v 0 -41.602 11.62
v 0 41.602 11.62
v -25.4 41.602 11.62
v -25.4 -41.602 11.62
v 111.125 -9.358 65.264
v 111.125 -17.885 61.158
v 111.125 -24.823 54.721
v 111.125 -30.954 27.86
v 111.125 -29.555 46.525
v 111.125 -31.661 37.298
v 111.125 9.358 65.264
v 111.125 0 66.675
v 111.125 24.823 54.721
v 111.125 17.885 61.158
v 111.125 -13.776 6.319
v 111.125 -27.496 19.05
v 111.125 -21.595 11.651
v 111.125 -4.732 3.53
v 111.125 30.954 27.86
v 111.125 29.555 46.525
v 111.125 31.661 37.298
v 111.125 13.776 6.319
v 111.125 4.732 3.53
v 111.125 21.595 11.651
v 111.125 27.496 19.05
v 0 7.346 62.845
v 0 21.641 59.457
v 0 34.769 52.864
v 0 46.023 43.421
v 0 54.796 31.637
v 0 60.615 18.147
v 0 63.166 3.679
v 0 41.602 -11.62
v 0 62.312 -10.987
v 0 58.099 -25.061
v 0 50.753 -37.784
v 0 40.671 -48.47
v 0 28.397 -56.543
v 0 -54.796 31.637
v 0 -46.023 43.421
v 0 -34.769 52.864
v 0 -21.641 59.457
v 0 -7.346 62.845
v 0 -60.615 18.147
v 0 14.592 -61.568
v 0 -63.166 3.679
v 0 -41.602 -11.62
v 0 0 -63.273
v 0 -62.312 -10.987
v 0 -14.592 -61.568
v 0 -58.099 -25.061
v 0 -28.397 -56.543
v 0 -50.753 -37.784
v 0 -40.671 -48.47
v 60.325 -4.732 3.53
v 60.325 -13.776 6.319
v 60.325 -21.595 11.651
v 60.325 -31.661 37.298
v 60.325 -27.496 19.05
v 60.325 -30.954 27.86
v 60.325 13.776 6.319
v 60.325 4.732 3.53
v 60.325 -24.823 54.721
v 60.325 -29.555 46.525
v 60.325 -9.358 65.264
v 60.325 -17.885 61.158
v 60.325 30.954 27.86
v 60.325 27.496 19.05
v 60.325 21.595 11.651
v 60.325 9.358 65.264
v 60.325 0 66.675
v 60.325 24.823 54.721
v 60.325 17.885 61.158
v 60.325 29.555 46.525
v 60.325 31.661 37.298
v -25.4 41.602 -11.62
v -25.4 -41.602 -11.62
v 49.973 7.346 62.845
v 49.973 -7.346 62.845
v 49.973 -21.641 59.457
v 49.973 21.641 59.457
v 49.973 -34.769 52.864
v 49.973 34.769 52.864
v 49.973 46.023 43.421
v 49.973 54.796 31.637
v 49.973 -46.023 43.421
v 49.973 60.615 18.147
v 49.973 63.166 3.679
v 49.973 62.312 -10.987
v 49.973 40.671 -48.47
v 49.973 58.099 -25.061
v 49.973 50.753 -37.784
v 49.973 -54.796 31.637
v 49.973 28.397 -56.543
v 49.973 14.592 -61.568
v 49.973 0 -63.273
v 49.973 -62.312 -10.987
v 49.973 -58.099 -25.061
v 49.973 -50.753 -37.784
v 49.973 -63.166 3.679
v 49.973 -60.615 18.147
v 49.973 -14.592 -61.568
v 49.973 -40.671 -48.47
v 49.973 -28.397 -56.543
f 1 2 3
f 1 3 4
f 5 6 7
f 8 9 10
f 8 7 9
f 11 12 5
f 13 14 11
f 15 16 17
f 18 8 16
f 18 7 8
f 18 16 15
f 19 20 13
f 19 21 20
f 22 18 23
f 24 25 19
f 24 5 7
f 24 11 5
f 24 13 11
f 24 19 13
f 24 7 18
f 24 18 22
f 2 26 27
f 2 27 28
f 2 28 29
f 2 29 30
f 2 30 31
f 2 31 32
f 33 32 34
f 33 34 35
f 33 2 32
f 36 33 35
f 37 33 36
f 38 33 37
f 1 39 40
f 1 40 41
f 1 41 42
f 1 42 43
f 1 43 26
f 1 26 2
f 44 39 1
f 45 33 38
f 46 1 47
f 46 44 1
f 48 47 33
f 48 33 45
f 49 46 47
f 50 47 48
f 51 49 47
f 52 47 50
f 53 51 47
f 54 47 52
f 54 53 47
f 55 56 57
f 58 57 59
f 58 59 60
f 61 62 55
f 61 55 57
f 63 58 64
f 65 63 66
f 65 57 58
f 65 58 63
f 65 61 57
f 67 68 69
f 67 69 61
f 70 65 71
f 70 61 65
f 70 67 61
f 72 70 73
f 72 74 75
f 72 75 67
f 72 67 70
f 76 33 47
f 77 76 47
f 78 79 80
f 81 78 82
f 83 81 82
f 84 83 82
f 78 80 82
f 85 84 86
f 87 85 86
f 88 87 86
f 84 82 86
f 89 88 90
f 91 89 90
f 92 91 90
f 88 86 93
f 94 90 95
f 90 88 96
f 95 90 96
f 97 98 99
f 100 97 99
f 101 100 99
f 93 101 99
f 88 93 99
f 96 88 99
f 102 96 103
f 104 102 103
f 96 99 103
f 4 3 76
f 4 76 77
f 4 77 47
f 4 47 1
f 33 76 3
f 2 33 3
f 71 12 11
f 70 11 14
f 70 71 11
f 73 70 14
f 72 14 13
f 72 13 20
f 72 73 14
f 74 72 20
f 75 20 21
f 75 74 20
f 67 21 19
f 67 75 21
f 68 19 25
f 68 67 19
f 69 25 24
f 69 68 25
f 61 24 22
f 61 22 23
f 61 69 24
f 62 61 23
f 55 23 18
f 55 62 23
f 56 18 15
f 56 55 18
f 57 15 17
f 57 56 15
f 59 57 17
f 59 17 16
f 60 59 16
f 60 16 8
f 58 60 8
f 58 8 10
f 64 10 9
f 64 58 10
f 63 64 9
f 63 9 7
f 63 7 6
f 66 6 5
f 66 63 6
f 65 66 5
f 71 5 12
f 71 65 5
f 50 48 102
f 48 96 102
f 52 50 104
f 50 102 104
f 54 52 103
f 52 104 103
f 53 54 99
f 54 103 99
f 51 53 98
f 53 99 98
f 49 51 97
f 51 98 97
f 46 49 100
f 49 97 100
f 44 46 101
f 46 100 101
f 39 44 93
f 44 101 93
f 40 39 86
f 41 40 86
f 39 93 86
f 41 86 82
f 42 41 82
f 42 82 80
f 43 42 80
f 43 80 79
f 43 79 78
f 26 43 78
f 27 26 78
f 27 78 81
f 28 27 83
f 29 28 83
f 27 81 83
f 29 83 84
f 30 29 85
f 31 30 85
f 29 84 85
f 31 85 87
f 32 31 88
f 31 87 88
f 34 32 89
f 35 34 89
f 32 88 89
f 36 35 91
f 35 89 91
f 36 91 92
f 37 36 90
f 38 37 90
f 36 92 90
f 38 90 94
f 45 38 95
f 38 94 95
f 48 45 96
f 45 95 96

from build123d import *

# Parameters (mm, degrees)
F2_W     = 49.973063
F2_H     = 63.273296
F4_R     = 41.479948
F5_DEPTH = 49.973063
F6_W     = 83.203434
F6_H     = 23.239038
F7_DEPTH = 25.4


with BuildPart() as f1:
    # F0 (on Front) → F1 (revolve)
    with BuildSketch(Plane.XZ):
        Polygon((60.325, 60.325), (60.325, 41.275), (60.325, 34.925), (111.125, 34.925), (111.125, 66.675), (60.325, 66.675), align=None)
    revolve(axis=Axis((85.725, 0, 34.925), (-1, 0, 0)))


with BuildPart() as f3:
    # F2 (on Front) → F3 (revolve)
    with BuildSketch(Plane.XZ):
        with Locations((24.986531, -31.636648)):
            Rectangle(F2_W, F2_H)
    revolve(axis=Axis((24.986532, 0, 0), (-1, 0, 0)))

    # F4 (on face) → F5 (join, through all)
    with BuildSketch(Plane(origin=(0, 0, 0), x_dir=(0, -1, 0), z_dir=(-1, 0, 0))):
        Circle(F4_R)
    extrude(amount=-F5_DEPTH)

    # F6 (on face) → F7 (join)
    with BuildSketch(Plane(origin=(0, 0, 0), x_dir=(0, -1, 0), z_dir=(-1, 0, 0))):
        Rectangle(F6_W, F6_H)
    extrude(amount=F7_DEPTH)


solid = Compound([f1.part, f3.part])
